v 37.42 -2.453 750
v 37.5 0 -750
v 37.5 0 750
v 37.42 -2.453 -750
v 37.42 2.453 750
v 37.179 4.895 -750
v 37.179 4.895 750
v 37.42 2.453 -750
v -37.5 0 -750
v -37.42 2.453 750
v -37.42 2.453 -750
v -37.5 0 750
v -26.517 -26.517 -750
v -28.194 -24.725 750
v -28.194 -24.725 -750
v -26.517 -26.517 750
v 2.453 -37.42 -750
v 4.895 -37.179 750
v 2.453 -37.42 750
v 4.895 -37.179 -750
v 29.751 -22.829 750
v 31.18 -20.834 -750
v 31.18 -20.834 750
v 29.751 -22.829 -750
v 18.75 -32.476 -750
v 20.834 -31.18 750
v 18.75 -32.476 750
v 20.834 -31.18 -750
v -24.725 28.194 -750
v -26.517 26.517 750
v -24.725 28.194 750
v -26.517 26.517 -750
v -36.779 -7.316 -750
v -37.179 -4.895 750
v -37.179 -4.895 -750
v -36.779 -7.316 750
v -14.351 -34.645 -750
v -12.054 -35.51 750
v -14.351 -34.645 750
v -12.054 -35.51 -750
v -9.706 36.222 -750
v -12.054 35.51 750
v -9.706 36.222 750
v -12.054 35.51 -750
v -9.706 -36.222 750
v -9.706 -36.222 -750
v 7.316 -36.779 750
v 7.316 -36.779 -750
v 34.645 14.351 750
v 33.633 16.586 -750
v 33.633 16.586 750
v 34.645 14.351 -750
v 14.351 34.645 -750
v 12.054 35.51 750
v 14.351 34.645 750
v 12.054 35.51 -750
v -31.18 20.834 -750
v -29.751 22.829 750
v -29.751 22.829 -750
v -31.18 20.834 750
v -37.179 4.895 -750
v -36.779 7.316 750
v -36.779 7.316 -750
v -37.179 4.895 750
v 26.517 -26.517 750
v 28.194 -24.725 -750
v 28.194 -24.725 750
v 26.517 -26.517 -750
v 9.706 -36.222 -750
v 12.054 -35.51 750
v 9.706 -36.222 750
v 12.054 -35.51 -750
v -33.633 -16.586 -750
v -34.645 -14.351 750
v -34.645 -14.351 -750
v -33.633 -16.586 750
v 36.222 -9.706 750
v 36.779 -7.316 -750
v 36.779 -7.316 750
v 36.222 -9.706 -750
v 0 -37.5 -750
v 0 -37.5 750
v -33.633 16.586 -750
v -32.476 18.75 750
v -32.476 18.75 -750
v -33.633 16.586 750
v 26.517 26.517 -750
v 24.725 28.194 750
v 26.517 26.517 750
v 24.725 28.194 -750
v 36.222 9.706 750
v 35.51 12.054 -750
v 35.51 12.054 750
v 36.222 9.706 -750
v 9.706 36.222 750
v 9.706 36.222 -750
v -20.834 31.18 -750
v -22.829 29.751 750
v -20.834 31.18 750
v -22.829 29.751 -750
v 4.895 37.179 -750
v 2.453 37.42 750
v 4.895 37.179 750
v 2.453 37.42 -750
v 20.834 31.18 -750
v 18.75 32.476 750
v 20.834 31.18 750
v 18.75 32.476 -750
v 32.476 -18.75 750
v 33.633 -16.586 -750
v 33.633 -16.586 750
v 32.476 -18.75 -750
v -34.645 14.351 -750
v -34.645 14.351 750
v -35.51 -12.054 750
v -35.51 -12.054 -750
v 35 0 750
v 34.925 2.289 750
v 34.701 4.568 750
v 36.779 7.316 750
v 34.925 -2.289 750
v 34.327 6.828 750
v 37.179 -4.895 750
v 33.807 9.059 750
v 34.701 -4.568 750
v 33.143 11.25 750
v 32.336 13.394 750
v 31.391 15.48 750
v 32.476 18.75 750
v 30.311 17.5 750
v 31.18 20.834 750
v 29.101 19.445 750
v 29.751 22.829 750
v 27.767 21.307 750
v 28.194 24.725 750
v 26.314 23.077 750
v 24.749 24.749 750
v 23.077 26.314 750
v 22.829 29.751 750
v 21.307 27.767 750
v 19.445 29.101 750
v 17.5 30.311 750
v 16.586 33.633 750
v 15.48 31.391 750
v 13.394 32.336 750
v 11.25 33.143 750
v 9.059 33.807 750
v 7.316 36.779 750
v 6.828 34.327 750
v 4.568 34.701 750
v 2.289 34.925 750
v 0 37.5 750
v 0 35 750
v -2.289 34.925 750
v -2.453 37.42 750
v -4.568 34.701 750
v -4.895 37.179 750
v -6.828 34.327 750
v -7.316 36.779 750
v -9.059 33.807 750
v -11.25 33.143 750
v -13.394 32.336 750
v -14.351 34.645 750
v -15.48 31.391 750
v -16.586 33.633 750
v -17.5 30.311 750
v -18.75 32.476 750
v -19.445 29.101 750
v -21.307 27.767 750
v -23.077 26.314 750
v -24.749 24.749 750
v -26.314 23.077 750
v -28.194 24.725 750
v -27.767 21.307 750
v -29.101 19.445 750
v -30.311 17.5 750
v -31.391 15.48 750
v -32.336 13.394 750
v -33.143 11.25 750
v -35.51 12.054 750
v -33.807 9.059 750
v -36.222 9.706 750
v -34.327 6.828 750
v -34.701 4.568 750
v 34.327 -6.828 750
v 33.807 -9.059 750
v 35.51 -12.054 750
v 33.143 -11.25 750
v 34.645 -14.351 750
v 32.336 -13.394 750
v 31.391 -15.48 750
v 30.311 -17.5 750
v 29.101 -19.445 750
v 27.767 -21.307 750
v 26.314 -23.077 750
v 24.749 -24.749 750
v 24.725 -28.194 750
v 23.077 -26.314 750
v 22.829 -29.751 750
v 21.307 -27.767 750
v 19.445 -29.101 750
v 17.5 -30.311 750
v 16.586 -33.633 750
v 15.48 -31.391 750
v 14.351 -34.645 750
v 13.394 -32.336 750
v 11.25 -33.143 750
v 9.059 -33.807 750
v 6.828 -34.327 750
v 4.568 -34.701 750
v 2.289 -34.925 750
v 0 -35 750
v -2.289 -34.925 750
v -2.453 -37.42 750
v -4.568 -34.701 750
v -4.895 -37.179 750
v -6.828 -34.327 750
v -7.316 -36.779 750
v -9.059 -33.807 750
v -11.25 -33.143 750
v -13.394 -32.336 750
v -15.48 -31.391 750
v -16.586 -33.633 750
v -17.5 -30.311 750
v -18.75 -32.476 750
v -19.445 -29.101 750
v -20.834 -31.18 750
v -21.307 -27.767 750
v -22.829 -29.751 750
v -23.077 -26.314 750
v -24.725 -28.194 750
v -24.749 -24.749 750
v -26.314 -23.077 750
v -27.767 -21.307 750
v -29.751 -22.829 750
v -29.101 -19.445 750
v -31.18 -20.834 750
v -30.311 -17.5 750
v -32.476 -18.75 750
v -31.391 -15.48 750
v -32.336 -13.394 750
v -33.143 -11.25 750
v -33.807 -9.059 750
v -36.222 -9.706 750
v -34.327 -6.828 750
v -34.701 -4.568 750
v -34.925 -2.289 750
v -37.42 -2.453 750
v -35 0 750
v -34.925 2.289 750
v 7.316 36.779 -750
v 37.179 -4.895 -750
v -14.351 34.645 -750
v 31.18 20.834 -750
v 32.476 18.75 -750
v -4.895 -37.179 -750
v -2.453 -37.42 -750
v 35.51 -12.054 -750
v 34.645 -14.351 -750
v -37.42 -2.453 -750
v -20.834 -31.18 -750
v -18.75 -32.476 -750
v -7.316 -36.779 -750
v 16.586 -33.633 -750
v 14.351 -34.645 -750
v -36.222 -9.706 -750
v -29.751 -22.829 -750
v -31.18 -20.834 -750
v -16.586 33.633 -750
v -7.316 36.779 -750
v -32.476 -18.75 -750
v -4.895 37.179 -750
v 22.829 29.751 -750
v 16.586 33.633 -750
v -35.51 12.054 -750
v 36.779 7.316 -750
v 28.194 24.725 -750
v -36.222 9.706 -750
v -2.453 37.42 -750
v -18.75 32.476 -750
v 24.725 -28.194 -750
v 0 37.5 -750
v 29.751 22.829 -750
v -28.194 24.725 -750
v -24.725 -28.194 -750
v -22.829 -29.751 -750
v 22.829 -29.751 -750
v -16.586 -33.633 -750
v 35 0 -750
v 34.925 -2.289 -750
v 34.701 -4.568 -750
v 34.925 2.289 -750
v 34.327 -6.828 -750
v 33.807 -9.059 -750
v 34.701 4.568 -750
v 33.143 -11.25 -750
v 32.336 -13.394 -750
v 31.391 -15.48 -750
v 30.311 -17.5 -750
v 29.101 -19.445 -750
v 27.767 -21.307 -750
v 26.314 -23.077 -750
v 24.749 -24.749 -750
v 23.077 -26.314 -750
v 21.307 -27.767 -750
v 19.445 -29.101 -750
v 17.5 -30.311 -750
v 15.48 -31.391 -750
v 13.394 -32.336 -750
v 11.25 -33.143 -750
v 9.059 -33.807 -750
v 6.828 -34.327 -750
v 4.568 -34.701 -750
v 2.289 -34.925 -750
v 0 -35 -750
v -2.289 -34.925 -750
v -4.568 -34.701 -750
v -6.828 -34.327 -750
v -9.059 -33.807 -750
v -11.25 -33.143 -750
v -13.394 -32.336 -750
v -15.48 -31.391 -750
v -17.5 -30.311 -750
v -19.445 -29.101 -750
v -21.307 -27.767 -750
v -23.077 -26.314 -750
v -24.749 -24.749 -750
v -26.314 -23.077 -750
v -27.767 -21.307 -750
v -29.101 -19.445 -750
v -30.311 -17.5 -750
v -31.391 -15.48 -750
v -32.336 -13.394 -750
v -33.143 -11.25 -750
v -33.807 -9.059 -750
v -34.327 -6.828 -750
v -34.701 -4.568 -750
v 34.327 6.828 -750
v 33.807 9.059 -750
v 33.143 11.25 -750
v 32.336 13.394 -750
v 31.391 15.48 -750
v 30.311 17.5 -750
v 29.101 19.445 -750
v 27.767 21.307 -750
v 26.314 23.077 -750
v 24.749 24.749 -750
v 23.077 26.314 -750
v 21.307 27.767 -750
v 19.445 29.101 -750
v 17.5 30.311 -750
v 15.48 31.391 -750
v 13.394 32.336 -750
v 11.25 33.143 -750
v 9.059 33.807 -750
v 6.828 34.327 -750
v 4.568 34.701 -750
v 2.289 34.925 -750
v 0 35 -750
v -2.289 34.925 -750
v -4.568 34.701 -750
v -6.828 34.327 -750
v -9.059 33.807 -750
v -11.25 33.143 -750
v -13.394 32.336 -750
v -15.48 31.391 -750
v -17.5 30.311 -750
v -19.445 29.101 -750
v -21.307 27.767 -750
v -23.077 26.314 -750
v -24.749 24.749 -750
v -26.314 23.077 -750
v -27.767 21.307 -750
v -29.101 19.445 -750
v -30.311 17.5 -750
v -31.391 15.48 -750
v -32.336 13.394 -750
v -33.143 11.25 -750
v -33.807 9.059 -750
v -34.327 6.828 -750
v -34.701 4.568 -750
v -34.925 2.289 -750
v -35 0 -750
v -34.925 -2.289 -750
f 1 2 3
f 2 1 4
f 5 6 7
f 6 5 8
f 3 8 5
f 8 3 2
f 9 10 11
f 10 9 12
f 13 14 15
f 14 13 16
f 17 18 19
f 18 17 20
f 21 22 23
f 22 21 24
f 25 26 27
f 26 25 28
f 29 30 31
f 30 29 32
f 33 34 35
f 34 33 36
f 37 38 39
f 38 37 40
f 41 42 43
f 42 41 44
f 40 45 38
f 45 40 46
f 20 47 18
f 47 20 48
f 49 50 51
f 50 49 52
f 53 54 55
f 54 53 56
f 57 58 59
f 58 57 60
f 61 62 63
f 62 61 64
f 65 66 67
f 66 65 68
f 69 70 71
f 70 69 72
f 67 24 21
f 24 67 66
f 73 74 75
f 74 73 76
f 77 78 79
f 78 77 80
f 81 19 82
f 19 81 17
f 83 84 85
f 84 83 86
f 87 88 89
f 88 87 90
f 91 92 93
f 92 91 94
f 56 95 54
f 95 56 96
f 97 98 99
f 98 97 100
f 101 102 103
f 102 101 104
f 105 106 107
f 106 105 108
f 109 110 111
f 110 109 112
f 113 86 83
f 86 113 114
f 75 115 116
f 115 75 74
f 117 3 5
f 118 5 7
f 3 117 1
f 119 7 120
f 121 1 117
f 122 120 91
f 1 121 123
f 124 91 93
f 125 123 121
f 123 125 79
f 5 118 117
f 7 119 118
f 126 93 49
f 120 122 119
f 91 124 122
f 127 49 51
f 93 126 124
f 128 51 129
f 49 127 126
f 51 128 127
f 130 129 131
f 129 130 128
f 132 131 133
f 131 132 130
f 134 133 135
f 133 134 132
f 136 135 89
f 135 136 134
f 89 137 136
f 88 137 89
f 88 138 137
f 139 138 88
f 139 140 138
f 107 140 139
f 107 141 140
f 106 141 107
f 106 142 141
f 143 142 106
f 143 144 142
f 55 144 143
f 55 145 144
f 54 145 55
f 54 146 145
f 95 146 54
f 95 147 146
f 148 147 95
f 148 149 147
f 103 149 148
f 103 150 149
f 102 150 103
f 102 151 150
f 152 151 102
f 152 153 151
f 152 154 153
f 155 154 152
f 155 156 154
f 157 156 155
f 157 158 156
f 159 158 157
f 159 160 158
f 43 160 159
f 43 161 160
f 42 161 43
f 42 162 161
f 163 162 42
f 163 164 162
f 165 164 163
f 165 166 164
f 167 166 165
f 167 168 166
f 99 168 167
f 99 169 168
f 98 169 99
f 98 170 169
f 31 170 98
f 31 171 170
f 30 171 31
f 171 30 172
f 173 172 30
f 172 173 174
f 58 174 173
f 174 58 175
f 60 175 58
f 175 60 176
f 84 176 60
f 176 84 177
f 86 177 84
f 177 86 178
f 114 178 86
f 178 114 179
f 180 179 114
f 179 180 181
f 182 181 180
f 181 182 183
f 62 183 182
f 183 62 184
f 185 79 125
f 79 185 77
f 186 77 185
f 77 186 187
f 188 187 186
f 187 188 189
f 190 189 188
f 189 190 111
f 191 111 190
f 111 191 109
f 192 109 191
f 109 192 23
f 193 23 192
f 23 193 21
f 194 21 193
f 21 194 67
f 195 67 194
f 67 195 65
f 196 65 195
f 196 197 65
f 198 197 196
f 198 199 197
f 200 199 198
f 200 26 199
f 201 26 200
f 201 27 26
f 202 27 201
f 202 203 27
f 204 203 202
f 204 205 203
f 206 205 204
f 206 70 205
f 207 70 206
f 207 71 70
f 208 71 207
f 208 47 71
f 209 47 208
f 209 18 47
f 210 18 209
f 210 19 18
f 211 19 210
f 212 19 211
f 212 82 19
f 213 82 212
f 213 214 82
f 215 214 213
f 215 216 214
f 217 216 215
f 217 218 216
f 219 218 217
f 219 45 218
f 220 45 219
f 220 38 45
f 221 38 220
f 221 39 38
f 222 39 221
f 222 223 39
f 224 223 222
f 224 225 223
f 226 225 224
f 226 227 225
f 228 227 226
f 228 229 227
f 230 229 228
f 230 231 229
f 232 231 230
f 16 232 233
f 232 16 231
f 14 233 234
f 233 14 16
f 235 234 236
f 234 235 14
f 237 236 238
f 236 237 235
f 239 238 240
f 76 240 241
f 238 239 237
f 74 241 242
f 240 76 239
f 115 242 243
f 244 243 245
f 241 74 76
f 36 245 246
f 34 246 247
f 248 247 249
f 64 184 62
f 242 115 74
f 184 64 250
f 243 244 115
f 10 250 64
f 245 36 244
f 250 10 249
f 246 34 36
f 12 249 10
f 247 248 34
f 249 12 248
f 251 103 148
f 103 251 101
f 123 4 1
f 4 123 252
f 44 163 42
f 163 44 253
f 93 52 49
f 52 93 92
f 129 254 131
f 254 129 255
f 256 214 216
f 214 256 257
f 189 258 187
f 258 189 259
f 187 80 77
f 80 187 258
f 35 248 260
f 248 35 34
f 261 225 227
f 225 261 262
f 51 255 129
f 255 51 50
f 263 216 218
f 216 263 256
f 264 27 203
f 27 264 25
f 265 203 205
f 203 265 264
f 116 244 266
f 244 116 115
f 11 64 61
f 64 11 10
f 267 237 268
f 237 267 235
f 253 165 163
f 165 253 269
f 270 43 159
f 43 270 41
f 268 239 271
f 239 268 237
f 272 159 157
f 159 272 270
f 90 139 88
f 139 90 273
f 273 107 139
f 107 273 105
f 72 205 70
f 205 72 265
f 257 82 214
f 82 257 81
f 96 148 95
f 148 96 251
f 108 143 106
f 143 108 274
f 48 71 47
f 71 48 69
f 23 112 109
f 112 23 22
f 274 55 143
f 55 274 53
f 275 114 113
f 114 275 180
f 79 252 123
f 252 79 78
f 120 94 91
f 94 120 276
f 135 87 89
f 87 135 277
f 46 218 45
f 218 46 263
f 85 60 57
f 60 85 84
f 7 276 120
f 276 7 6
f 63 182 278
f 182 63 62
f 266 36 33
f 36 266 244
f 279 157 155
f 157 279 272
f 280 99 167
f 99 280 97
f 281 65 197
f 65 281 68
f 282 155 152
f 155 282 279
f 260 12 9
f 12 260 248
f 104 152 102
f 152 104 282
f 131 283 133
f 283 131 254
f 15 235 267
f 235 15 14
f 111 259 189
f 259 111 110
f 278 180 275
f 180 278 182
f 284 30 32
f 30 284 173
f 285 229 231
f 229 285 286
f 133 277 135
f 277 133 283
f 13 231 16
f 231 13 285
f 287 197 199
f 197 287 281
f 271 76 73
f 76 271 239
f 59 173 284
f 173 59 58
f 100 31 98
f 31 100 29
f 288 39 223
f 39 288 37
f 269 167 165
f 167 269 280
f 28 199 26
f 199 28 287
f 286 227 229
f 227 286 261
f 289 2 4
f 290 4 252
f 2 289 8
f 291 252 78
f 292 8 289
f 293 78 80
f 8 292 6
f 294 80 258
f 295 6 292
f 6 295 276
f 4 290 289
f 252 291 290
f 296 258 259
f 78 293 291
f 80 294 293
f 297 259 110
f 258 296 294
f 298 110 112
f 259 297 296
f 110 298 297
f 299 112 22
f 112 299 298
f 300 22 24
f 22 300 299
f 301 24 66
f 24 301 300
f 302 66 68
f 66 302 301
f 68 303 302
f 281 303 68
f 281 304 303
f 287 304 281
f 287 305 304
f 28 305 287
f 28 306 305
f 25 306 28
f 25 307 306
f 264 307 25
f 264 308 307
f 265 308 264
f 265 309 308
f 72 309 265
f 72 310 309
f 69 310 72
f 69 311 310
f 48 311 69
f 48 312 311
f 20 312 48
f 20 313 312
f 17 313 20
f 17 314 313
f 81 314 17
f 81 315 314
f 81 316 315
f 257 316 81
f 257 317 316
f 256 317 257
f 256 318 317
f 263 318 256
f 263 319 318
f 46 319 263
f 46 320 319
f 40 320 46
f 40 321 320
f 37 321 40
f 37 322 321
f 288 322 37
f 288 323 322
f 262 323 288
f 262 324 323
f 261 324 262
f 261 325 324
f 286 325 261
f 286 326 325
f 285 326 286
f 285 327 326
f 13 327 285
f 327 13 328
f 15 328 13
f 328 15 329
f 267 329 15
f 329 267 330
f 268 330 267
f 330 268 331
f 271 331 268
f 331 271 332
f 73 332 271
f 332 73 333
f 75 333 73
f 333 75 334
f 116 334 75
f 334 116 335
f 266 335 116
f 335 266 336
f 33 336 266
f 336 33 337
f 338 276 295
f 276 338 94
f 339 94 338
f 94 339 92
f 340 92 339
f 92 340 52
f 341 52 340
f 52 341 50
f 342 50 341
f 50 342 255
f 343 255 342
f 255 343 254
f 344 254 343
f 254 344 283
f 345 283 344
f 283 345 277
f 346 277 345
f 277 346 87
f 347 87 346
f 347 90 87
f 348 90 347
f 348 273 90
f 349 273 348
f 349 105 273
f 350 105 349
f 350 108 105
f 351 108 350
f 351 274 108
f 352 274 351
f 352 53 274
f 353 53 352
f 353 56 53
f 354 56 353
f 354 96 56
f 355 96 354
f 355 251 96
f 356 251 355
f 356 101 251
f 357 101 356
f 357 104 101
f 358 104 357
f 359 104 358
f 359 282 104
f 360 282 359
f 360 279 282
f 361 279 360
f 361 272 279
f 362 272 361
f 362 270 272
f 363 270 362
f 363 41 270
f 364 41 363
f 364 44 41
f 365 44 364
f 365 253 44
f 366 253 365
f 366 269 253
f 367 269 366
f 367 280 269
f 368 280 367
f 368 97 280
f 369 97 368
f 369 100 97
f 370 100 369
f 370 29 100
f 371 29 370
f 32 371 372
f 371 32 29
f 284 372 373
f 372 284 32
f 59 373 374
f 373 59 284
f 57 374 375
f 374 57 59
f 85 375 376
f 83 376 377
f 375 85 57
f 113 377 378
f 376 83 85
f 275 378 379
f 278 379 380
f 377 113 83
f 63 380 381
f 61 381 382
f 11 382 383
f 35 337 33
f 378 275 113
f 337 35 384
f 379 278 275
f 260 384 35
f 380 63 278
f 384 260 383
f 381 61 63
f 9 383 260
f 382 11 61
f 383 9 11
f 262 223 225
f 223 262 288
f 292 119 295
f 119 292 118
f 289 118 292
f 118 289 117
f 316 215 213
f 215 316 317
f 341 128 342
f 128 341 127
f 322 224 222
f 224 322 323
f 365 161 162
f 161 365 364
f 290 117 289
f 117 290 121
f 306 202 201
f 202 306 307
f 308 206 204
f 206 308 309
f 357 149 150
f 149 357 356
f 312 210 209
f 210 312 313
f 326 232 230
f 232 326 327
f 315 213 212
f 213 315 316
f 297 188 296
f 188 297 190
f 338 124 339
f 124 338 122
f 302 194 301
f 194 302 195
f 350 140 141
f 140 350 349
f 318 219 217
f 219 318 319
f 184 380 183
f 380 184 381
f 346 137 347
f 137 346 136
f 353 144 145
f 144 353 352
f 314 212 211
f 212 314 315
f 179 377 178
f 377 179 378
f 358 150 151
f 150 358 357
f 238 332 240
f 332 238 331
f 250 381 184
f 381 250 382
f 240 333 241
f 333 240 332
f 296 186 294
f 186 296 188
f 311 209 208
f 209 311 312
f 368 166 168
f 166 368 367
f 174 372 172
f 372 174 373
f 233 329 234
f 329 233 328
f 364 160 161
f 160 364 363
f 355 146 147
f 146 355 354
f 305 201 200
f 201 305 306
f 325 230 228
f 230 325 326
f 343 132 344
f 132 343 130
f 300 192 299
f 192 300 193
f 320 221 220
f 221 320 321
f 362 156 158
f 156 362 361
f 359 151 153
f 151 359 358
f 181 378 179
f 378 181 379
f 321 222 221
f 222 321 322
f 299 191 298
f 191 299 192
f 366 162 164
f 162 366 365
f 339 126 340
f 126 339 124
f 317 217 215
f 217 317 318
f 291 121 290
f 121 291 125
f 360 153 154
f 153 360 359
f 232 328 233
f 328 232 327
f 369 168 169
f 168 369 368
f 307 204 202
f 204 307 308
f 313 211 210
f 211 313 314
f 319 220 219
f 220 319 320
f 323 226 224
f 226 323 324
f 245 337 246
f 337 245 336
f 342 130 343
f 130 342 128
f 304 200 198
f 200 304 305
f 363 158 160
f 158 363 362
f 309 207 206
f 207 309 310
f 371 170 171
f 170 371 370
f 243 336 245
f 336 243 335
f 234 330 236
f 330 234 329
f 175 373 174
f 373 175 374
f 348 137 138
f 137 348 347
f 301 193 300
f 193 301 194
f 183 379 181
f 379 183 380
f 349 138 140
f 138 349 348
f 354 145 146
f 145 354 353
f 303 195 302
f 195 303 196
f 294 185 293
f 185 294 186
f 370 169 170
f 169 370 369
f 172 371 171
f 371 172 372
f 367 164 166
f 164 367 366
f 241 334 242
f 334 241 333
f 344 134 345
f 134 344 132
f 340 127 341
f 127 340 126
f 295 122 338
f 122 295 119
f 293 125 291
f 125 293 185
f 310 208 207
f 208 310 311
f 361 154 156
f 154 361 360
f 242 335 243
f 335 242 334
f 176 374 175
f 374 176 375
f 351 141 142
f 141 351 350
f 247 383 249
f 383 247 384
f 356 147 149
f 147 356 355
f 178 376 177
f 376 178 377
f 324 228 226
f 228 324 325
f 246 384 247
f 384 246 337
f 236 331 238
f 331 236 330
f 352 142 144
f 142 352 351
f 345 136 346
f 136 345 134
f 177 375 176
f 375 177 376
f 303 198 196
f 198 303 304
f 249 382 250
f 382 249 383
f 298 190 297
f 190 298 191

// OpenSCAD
$fn=96;

module ht_pipe(od=75, length=1500, wall=2.5) {
    difference() {
        cylinder(h=length, d=od, center=true);
        cylinder(h=length+2, d=od-2*wall, center=true);
    }
}

ht_pipe(od=75, length=1500, wall=2.5);
